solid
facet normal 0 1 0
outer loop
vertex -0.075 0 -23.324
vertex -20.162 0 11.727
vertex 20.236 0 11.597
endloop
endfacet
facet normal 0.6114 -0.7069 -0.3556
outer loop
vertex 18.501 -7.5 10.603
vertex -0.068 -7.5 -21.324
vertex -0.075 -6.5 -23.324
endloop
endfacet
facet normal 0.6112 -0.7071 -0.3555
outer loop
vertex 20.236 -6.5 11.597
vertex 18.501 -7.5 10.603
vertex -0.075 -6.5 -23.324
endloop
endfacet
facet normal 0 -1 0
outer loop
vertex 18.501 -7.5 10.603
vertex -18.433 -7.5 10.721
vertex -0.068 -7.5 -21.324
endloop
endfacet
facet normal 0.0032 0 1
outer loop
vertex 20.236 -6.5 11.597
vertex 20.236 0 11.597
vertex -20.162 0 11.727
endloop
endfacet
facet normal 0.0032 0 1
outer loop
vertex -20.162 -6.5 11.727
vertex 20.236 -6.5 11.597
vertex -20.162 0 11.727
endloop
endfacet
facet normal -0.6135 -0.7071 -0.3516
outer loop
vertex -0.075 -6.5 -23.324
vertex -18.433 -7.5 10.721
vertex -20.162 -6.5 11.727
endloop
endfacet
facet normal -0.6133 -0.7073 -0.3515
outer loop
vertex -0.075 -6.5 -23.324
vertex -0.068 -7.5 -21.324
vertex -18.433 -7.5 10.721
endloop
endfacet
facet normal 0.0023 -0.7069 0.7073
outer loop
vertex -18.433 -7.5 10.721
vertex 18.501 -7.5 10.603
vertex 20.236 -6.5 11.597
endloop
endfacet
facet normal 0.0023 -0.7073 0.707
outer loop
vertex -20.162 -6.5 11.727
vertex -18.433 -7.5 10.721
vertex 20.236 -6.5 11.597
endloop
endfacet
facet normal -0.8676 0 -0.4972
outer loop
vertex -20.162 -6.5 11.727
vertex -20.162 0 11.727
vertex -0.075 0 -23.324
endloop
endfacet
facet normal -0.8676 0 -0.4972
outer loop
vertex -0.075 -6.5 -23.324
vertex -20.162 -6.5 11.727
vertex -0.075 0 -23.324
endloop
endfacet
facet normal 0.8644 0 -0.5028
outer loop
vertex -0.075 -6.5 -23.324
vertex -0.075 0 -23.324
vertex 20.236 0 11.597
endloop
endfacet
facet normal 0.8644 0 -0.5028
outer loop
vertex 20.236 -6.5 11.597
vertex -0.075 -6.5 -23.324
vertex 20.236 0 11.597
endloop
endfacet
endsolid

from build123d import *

# Parameters (mm, degrees)
F1_DEPTH = 15
F2_SIZE  = 2
F3_SCALE = 0.5


with BuildPart() as f1:
    # F0 (on Front) → F1 (new body)
    with BuildSketch(Plane.XZ):
        Polygon((-0.1495843466, -46.6474431687), (40.472662979, 23.1941777401), (-40.3230786324, 23.4532654285), align=None)
    extrude(amount=F1_DEPTH)

    # F2
    f2_edges = [f1.edges().sort_by_distance(p)[0] for p in [
        (0.074792, -15, 23.323722),
        (20.161539, -15, -11.726633),
        (-20.236331, -15, -11.597089),
    ]]
    chamfer(f2_edges, length=F2_SIZE)


with BuildPart() as f1_1:
    # F3: moved
    add(f1.part.scale(F3_SCALE))


solid = f1_1.part
